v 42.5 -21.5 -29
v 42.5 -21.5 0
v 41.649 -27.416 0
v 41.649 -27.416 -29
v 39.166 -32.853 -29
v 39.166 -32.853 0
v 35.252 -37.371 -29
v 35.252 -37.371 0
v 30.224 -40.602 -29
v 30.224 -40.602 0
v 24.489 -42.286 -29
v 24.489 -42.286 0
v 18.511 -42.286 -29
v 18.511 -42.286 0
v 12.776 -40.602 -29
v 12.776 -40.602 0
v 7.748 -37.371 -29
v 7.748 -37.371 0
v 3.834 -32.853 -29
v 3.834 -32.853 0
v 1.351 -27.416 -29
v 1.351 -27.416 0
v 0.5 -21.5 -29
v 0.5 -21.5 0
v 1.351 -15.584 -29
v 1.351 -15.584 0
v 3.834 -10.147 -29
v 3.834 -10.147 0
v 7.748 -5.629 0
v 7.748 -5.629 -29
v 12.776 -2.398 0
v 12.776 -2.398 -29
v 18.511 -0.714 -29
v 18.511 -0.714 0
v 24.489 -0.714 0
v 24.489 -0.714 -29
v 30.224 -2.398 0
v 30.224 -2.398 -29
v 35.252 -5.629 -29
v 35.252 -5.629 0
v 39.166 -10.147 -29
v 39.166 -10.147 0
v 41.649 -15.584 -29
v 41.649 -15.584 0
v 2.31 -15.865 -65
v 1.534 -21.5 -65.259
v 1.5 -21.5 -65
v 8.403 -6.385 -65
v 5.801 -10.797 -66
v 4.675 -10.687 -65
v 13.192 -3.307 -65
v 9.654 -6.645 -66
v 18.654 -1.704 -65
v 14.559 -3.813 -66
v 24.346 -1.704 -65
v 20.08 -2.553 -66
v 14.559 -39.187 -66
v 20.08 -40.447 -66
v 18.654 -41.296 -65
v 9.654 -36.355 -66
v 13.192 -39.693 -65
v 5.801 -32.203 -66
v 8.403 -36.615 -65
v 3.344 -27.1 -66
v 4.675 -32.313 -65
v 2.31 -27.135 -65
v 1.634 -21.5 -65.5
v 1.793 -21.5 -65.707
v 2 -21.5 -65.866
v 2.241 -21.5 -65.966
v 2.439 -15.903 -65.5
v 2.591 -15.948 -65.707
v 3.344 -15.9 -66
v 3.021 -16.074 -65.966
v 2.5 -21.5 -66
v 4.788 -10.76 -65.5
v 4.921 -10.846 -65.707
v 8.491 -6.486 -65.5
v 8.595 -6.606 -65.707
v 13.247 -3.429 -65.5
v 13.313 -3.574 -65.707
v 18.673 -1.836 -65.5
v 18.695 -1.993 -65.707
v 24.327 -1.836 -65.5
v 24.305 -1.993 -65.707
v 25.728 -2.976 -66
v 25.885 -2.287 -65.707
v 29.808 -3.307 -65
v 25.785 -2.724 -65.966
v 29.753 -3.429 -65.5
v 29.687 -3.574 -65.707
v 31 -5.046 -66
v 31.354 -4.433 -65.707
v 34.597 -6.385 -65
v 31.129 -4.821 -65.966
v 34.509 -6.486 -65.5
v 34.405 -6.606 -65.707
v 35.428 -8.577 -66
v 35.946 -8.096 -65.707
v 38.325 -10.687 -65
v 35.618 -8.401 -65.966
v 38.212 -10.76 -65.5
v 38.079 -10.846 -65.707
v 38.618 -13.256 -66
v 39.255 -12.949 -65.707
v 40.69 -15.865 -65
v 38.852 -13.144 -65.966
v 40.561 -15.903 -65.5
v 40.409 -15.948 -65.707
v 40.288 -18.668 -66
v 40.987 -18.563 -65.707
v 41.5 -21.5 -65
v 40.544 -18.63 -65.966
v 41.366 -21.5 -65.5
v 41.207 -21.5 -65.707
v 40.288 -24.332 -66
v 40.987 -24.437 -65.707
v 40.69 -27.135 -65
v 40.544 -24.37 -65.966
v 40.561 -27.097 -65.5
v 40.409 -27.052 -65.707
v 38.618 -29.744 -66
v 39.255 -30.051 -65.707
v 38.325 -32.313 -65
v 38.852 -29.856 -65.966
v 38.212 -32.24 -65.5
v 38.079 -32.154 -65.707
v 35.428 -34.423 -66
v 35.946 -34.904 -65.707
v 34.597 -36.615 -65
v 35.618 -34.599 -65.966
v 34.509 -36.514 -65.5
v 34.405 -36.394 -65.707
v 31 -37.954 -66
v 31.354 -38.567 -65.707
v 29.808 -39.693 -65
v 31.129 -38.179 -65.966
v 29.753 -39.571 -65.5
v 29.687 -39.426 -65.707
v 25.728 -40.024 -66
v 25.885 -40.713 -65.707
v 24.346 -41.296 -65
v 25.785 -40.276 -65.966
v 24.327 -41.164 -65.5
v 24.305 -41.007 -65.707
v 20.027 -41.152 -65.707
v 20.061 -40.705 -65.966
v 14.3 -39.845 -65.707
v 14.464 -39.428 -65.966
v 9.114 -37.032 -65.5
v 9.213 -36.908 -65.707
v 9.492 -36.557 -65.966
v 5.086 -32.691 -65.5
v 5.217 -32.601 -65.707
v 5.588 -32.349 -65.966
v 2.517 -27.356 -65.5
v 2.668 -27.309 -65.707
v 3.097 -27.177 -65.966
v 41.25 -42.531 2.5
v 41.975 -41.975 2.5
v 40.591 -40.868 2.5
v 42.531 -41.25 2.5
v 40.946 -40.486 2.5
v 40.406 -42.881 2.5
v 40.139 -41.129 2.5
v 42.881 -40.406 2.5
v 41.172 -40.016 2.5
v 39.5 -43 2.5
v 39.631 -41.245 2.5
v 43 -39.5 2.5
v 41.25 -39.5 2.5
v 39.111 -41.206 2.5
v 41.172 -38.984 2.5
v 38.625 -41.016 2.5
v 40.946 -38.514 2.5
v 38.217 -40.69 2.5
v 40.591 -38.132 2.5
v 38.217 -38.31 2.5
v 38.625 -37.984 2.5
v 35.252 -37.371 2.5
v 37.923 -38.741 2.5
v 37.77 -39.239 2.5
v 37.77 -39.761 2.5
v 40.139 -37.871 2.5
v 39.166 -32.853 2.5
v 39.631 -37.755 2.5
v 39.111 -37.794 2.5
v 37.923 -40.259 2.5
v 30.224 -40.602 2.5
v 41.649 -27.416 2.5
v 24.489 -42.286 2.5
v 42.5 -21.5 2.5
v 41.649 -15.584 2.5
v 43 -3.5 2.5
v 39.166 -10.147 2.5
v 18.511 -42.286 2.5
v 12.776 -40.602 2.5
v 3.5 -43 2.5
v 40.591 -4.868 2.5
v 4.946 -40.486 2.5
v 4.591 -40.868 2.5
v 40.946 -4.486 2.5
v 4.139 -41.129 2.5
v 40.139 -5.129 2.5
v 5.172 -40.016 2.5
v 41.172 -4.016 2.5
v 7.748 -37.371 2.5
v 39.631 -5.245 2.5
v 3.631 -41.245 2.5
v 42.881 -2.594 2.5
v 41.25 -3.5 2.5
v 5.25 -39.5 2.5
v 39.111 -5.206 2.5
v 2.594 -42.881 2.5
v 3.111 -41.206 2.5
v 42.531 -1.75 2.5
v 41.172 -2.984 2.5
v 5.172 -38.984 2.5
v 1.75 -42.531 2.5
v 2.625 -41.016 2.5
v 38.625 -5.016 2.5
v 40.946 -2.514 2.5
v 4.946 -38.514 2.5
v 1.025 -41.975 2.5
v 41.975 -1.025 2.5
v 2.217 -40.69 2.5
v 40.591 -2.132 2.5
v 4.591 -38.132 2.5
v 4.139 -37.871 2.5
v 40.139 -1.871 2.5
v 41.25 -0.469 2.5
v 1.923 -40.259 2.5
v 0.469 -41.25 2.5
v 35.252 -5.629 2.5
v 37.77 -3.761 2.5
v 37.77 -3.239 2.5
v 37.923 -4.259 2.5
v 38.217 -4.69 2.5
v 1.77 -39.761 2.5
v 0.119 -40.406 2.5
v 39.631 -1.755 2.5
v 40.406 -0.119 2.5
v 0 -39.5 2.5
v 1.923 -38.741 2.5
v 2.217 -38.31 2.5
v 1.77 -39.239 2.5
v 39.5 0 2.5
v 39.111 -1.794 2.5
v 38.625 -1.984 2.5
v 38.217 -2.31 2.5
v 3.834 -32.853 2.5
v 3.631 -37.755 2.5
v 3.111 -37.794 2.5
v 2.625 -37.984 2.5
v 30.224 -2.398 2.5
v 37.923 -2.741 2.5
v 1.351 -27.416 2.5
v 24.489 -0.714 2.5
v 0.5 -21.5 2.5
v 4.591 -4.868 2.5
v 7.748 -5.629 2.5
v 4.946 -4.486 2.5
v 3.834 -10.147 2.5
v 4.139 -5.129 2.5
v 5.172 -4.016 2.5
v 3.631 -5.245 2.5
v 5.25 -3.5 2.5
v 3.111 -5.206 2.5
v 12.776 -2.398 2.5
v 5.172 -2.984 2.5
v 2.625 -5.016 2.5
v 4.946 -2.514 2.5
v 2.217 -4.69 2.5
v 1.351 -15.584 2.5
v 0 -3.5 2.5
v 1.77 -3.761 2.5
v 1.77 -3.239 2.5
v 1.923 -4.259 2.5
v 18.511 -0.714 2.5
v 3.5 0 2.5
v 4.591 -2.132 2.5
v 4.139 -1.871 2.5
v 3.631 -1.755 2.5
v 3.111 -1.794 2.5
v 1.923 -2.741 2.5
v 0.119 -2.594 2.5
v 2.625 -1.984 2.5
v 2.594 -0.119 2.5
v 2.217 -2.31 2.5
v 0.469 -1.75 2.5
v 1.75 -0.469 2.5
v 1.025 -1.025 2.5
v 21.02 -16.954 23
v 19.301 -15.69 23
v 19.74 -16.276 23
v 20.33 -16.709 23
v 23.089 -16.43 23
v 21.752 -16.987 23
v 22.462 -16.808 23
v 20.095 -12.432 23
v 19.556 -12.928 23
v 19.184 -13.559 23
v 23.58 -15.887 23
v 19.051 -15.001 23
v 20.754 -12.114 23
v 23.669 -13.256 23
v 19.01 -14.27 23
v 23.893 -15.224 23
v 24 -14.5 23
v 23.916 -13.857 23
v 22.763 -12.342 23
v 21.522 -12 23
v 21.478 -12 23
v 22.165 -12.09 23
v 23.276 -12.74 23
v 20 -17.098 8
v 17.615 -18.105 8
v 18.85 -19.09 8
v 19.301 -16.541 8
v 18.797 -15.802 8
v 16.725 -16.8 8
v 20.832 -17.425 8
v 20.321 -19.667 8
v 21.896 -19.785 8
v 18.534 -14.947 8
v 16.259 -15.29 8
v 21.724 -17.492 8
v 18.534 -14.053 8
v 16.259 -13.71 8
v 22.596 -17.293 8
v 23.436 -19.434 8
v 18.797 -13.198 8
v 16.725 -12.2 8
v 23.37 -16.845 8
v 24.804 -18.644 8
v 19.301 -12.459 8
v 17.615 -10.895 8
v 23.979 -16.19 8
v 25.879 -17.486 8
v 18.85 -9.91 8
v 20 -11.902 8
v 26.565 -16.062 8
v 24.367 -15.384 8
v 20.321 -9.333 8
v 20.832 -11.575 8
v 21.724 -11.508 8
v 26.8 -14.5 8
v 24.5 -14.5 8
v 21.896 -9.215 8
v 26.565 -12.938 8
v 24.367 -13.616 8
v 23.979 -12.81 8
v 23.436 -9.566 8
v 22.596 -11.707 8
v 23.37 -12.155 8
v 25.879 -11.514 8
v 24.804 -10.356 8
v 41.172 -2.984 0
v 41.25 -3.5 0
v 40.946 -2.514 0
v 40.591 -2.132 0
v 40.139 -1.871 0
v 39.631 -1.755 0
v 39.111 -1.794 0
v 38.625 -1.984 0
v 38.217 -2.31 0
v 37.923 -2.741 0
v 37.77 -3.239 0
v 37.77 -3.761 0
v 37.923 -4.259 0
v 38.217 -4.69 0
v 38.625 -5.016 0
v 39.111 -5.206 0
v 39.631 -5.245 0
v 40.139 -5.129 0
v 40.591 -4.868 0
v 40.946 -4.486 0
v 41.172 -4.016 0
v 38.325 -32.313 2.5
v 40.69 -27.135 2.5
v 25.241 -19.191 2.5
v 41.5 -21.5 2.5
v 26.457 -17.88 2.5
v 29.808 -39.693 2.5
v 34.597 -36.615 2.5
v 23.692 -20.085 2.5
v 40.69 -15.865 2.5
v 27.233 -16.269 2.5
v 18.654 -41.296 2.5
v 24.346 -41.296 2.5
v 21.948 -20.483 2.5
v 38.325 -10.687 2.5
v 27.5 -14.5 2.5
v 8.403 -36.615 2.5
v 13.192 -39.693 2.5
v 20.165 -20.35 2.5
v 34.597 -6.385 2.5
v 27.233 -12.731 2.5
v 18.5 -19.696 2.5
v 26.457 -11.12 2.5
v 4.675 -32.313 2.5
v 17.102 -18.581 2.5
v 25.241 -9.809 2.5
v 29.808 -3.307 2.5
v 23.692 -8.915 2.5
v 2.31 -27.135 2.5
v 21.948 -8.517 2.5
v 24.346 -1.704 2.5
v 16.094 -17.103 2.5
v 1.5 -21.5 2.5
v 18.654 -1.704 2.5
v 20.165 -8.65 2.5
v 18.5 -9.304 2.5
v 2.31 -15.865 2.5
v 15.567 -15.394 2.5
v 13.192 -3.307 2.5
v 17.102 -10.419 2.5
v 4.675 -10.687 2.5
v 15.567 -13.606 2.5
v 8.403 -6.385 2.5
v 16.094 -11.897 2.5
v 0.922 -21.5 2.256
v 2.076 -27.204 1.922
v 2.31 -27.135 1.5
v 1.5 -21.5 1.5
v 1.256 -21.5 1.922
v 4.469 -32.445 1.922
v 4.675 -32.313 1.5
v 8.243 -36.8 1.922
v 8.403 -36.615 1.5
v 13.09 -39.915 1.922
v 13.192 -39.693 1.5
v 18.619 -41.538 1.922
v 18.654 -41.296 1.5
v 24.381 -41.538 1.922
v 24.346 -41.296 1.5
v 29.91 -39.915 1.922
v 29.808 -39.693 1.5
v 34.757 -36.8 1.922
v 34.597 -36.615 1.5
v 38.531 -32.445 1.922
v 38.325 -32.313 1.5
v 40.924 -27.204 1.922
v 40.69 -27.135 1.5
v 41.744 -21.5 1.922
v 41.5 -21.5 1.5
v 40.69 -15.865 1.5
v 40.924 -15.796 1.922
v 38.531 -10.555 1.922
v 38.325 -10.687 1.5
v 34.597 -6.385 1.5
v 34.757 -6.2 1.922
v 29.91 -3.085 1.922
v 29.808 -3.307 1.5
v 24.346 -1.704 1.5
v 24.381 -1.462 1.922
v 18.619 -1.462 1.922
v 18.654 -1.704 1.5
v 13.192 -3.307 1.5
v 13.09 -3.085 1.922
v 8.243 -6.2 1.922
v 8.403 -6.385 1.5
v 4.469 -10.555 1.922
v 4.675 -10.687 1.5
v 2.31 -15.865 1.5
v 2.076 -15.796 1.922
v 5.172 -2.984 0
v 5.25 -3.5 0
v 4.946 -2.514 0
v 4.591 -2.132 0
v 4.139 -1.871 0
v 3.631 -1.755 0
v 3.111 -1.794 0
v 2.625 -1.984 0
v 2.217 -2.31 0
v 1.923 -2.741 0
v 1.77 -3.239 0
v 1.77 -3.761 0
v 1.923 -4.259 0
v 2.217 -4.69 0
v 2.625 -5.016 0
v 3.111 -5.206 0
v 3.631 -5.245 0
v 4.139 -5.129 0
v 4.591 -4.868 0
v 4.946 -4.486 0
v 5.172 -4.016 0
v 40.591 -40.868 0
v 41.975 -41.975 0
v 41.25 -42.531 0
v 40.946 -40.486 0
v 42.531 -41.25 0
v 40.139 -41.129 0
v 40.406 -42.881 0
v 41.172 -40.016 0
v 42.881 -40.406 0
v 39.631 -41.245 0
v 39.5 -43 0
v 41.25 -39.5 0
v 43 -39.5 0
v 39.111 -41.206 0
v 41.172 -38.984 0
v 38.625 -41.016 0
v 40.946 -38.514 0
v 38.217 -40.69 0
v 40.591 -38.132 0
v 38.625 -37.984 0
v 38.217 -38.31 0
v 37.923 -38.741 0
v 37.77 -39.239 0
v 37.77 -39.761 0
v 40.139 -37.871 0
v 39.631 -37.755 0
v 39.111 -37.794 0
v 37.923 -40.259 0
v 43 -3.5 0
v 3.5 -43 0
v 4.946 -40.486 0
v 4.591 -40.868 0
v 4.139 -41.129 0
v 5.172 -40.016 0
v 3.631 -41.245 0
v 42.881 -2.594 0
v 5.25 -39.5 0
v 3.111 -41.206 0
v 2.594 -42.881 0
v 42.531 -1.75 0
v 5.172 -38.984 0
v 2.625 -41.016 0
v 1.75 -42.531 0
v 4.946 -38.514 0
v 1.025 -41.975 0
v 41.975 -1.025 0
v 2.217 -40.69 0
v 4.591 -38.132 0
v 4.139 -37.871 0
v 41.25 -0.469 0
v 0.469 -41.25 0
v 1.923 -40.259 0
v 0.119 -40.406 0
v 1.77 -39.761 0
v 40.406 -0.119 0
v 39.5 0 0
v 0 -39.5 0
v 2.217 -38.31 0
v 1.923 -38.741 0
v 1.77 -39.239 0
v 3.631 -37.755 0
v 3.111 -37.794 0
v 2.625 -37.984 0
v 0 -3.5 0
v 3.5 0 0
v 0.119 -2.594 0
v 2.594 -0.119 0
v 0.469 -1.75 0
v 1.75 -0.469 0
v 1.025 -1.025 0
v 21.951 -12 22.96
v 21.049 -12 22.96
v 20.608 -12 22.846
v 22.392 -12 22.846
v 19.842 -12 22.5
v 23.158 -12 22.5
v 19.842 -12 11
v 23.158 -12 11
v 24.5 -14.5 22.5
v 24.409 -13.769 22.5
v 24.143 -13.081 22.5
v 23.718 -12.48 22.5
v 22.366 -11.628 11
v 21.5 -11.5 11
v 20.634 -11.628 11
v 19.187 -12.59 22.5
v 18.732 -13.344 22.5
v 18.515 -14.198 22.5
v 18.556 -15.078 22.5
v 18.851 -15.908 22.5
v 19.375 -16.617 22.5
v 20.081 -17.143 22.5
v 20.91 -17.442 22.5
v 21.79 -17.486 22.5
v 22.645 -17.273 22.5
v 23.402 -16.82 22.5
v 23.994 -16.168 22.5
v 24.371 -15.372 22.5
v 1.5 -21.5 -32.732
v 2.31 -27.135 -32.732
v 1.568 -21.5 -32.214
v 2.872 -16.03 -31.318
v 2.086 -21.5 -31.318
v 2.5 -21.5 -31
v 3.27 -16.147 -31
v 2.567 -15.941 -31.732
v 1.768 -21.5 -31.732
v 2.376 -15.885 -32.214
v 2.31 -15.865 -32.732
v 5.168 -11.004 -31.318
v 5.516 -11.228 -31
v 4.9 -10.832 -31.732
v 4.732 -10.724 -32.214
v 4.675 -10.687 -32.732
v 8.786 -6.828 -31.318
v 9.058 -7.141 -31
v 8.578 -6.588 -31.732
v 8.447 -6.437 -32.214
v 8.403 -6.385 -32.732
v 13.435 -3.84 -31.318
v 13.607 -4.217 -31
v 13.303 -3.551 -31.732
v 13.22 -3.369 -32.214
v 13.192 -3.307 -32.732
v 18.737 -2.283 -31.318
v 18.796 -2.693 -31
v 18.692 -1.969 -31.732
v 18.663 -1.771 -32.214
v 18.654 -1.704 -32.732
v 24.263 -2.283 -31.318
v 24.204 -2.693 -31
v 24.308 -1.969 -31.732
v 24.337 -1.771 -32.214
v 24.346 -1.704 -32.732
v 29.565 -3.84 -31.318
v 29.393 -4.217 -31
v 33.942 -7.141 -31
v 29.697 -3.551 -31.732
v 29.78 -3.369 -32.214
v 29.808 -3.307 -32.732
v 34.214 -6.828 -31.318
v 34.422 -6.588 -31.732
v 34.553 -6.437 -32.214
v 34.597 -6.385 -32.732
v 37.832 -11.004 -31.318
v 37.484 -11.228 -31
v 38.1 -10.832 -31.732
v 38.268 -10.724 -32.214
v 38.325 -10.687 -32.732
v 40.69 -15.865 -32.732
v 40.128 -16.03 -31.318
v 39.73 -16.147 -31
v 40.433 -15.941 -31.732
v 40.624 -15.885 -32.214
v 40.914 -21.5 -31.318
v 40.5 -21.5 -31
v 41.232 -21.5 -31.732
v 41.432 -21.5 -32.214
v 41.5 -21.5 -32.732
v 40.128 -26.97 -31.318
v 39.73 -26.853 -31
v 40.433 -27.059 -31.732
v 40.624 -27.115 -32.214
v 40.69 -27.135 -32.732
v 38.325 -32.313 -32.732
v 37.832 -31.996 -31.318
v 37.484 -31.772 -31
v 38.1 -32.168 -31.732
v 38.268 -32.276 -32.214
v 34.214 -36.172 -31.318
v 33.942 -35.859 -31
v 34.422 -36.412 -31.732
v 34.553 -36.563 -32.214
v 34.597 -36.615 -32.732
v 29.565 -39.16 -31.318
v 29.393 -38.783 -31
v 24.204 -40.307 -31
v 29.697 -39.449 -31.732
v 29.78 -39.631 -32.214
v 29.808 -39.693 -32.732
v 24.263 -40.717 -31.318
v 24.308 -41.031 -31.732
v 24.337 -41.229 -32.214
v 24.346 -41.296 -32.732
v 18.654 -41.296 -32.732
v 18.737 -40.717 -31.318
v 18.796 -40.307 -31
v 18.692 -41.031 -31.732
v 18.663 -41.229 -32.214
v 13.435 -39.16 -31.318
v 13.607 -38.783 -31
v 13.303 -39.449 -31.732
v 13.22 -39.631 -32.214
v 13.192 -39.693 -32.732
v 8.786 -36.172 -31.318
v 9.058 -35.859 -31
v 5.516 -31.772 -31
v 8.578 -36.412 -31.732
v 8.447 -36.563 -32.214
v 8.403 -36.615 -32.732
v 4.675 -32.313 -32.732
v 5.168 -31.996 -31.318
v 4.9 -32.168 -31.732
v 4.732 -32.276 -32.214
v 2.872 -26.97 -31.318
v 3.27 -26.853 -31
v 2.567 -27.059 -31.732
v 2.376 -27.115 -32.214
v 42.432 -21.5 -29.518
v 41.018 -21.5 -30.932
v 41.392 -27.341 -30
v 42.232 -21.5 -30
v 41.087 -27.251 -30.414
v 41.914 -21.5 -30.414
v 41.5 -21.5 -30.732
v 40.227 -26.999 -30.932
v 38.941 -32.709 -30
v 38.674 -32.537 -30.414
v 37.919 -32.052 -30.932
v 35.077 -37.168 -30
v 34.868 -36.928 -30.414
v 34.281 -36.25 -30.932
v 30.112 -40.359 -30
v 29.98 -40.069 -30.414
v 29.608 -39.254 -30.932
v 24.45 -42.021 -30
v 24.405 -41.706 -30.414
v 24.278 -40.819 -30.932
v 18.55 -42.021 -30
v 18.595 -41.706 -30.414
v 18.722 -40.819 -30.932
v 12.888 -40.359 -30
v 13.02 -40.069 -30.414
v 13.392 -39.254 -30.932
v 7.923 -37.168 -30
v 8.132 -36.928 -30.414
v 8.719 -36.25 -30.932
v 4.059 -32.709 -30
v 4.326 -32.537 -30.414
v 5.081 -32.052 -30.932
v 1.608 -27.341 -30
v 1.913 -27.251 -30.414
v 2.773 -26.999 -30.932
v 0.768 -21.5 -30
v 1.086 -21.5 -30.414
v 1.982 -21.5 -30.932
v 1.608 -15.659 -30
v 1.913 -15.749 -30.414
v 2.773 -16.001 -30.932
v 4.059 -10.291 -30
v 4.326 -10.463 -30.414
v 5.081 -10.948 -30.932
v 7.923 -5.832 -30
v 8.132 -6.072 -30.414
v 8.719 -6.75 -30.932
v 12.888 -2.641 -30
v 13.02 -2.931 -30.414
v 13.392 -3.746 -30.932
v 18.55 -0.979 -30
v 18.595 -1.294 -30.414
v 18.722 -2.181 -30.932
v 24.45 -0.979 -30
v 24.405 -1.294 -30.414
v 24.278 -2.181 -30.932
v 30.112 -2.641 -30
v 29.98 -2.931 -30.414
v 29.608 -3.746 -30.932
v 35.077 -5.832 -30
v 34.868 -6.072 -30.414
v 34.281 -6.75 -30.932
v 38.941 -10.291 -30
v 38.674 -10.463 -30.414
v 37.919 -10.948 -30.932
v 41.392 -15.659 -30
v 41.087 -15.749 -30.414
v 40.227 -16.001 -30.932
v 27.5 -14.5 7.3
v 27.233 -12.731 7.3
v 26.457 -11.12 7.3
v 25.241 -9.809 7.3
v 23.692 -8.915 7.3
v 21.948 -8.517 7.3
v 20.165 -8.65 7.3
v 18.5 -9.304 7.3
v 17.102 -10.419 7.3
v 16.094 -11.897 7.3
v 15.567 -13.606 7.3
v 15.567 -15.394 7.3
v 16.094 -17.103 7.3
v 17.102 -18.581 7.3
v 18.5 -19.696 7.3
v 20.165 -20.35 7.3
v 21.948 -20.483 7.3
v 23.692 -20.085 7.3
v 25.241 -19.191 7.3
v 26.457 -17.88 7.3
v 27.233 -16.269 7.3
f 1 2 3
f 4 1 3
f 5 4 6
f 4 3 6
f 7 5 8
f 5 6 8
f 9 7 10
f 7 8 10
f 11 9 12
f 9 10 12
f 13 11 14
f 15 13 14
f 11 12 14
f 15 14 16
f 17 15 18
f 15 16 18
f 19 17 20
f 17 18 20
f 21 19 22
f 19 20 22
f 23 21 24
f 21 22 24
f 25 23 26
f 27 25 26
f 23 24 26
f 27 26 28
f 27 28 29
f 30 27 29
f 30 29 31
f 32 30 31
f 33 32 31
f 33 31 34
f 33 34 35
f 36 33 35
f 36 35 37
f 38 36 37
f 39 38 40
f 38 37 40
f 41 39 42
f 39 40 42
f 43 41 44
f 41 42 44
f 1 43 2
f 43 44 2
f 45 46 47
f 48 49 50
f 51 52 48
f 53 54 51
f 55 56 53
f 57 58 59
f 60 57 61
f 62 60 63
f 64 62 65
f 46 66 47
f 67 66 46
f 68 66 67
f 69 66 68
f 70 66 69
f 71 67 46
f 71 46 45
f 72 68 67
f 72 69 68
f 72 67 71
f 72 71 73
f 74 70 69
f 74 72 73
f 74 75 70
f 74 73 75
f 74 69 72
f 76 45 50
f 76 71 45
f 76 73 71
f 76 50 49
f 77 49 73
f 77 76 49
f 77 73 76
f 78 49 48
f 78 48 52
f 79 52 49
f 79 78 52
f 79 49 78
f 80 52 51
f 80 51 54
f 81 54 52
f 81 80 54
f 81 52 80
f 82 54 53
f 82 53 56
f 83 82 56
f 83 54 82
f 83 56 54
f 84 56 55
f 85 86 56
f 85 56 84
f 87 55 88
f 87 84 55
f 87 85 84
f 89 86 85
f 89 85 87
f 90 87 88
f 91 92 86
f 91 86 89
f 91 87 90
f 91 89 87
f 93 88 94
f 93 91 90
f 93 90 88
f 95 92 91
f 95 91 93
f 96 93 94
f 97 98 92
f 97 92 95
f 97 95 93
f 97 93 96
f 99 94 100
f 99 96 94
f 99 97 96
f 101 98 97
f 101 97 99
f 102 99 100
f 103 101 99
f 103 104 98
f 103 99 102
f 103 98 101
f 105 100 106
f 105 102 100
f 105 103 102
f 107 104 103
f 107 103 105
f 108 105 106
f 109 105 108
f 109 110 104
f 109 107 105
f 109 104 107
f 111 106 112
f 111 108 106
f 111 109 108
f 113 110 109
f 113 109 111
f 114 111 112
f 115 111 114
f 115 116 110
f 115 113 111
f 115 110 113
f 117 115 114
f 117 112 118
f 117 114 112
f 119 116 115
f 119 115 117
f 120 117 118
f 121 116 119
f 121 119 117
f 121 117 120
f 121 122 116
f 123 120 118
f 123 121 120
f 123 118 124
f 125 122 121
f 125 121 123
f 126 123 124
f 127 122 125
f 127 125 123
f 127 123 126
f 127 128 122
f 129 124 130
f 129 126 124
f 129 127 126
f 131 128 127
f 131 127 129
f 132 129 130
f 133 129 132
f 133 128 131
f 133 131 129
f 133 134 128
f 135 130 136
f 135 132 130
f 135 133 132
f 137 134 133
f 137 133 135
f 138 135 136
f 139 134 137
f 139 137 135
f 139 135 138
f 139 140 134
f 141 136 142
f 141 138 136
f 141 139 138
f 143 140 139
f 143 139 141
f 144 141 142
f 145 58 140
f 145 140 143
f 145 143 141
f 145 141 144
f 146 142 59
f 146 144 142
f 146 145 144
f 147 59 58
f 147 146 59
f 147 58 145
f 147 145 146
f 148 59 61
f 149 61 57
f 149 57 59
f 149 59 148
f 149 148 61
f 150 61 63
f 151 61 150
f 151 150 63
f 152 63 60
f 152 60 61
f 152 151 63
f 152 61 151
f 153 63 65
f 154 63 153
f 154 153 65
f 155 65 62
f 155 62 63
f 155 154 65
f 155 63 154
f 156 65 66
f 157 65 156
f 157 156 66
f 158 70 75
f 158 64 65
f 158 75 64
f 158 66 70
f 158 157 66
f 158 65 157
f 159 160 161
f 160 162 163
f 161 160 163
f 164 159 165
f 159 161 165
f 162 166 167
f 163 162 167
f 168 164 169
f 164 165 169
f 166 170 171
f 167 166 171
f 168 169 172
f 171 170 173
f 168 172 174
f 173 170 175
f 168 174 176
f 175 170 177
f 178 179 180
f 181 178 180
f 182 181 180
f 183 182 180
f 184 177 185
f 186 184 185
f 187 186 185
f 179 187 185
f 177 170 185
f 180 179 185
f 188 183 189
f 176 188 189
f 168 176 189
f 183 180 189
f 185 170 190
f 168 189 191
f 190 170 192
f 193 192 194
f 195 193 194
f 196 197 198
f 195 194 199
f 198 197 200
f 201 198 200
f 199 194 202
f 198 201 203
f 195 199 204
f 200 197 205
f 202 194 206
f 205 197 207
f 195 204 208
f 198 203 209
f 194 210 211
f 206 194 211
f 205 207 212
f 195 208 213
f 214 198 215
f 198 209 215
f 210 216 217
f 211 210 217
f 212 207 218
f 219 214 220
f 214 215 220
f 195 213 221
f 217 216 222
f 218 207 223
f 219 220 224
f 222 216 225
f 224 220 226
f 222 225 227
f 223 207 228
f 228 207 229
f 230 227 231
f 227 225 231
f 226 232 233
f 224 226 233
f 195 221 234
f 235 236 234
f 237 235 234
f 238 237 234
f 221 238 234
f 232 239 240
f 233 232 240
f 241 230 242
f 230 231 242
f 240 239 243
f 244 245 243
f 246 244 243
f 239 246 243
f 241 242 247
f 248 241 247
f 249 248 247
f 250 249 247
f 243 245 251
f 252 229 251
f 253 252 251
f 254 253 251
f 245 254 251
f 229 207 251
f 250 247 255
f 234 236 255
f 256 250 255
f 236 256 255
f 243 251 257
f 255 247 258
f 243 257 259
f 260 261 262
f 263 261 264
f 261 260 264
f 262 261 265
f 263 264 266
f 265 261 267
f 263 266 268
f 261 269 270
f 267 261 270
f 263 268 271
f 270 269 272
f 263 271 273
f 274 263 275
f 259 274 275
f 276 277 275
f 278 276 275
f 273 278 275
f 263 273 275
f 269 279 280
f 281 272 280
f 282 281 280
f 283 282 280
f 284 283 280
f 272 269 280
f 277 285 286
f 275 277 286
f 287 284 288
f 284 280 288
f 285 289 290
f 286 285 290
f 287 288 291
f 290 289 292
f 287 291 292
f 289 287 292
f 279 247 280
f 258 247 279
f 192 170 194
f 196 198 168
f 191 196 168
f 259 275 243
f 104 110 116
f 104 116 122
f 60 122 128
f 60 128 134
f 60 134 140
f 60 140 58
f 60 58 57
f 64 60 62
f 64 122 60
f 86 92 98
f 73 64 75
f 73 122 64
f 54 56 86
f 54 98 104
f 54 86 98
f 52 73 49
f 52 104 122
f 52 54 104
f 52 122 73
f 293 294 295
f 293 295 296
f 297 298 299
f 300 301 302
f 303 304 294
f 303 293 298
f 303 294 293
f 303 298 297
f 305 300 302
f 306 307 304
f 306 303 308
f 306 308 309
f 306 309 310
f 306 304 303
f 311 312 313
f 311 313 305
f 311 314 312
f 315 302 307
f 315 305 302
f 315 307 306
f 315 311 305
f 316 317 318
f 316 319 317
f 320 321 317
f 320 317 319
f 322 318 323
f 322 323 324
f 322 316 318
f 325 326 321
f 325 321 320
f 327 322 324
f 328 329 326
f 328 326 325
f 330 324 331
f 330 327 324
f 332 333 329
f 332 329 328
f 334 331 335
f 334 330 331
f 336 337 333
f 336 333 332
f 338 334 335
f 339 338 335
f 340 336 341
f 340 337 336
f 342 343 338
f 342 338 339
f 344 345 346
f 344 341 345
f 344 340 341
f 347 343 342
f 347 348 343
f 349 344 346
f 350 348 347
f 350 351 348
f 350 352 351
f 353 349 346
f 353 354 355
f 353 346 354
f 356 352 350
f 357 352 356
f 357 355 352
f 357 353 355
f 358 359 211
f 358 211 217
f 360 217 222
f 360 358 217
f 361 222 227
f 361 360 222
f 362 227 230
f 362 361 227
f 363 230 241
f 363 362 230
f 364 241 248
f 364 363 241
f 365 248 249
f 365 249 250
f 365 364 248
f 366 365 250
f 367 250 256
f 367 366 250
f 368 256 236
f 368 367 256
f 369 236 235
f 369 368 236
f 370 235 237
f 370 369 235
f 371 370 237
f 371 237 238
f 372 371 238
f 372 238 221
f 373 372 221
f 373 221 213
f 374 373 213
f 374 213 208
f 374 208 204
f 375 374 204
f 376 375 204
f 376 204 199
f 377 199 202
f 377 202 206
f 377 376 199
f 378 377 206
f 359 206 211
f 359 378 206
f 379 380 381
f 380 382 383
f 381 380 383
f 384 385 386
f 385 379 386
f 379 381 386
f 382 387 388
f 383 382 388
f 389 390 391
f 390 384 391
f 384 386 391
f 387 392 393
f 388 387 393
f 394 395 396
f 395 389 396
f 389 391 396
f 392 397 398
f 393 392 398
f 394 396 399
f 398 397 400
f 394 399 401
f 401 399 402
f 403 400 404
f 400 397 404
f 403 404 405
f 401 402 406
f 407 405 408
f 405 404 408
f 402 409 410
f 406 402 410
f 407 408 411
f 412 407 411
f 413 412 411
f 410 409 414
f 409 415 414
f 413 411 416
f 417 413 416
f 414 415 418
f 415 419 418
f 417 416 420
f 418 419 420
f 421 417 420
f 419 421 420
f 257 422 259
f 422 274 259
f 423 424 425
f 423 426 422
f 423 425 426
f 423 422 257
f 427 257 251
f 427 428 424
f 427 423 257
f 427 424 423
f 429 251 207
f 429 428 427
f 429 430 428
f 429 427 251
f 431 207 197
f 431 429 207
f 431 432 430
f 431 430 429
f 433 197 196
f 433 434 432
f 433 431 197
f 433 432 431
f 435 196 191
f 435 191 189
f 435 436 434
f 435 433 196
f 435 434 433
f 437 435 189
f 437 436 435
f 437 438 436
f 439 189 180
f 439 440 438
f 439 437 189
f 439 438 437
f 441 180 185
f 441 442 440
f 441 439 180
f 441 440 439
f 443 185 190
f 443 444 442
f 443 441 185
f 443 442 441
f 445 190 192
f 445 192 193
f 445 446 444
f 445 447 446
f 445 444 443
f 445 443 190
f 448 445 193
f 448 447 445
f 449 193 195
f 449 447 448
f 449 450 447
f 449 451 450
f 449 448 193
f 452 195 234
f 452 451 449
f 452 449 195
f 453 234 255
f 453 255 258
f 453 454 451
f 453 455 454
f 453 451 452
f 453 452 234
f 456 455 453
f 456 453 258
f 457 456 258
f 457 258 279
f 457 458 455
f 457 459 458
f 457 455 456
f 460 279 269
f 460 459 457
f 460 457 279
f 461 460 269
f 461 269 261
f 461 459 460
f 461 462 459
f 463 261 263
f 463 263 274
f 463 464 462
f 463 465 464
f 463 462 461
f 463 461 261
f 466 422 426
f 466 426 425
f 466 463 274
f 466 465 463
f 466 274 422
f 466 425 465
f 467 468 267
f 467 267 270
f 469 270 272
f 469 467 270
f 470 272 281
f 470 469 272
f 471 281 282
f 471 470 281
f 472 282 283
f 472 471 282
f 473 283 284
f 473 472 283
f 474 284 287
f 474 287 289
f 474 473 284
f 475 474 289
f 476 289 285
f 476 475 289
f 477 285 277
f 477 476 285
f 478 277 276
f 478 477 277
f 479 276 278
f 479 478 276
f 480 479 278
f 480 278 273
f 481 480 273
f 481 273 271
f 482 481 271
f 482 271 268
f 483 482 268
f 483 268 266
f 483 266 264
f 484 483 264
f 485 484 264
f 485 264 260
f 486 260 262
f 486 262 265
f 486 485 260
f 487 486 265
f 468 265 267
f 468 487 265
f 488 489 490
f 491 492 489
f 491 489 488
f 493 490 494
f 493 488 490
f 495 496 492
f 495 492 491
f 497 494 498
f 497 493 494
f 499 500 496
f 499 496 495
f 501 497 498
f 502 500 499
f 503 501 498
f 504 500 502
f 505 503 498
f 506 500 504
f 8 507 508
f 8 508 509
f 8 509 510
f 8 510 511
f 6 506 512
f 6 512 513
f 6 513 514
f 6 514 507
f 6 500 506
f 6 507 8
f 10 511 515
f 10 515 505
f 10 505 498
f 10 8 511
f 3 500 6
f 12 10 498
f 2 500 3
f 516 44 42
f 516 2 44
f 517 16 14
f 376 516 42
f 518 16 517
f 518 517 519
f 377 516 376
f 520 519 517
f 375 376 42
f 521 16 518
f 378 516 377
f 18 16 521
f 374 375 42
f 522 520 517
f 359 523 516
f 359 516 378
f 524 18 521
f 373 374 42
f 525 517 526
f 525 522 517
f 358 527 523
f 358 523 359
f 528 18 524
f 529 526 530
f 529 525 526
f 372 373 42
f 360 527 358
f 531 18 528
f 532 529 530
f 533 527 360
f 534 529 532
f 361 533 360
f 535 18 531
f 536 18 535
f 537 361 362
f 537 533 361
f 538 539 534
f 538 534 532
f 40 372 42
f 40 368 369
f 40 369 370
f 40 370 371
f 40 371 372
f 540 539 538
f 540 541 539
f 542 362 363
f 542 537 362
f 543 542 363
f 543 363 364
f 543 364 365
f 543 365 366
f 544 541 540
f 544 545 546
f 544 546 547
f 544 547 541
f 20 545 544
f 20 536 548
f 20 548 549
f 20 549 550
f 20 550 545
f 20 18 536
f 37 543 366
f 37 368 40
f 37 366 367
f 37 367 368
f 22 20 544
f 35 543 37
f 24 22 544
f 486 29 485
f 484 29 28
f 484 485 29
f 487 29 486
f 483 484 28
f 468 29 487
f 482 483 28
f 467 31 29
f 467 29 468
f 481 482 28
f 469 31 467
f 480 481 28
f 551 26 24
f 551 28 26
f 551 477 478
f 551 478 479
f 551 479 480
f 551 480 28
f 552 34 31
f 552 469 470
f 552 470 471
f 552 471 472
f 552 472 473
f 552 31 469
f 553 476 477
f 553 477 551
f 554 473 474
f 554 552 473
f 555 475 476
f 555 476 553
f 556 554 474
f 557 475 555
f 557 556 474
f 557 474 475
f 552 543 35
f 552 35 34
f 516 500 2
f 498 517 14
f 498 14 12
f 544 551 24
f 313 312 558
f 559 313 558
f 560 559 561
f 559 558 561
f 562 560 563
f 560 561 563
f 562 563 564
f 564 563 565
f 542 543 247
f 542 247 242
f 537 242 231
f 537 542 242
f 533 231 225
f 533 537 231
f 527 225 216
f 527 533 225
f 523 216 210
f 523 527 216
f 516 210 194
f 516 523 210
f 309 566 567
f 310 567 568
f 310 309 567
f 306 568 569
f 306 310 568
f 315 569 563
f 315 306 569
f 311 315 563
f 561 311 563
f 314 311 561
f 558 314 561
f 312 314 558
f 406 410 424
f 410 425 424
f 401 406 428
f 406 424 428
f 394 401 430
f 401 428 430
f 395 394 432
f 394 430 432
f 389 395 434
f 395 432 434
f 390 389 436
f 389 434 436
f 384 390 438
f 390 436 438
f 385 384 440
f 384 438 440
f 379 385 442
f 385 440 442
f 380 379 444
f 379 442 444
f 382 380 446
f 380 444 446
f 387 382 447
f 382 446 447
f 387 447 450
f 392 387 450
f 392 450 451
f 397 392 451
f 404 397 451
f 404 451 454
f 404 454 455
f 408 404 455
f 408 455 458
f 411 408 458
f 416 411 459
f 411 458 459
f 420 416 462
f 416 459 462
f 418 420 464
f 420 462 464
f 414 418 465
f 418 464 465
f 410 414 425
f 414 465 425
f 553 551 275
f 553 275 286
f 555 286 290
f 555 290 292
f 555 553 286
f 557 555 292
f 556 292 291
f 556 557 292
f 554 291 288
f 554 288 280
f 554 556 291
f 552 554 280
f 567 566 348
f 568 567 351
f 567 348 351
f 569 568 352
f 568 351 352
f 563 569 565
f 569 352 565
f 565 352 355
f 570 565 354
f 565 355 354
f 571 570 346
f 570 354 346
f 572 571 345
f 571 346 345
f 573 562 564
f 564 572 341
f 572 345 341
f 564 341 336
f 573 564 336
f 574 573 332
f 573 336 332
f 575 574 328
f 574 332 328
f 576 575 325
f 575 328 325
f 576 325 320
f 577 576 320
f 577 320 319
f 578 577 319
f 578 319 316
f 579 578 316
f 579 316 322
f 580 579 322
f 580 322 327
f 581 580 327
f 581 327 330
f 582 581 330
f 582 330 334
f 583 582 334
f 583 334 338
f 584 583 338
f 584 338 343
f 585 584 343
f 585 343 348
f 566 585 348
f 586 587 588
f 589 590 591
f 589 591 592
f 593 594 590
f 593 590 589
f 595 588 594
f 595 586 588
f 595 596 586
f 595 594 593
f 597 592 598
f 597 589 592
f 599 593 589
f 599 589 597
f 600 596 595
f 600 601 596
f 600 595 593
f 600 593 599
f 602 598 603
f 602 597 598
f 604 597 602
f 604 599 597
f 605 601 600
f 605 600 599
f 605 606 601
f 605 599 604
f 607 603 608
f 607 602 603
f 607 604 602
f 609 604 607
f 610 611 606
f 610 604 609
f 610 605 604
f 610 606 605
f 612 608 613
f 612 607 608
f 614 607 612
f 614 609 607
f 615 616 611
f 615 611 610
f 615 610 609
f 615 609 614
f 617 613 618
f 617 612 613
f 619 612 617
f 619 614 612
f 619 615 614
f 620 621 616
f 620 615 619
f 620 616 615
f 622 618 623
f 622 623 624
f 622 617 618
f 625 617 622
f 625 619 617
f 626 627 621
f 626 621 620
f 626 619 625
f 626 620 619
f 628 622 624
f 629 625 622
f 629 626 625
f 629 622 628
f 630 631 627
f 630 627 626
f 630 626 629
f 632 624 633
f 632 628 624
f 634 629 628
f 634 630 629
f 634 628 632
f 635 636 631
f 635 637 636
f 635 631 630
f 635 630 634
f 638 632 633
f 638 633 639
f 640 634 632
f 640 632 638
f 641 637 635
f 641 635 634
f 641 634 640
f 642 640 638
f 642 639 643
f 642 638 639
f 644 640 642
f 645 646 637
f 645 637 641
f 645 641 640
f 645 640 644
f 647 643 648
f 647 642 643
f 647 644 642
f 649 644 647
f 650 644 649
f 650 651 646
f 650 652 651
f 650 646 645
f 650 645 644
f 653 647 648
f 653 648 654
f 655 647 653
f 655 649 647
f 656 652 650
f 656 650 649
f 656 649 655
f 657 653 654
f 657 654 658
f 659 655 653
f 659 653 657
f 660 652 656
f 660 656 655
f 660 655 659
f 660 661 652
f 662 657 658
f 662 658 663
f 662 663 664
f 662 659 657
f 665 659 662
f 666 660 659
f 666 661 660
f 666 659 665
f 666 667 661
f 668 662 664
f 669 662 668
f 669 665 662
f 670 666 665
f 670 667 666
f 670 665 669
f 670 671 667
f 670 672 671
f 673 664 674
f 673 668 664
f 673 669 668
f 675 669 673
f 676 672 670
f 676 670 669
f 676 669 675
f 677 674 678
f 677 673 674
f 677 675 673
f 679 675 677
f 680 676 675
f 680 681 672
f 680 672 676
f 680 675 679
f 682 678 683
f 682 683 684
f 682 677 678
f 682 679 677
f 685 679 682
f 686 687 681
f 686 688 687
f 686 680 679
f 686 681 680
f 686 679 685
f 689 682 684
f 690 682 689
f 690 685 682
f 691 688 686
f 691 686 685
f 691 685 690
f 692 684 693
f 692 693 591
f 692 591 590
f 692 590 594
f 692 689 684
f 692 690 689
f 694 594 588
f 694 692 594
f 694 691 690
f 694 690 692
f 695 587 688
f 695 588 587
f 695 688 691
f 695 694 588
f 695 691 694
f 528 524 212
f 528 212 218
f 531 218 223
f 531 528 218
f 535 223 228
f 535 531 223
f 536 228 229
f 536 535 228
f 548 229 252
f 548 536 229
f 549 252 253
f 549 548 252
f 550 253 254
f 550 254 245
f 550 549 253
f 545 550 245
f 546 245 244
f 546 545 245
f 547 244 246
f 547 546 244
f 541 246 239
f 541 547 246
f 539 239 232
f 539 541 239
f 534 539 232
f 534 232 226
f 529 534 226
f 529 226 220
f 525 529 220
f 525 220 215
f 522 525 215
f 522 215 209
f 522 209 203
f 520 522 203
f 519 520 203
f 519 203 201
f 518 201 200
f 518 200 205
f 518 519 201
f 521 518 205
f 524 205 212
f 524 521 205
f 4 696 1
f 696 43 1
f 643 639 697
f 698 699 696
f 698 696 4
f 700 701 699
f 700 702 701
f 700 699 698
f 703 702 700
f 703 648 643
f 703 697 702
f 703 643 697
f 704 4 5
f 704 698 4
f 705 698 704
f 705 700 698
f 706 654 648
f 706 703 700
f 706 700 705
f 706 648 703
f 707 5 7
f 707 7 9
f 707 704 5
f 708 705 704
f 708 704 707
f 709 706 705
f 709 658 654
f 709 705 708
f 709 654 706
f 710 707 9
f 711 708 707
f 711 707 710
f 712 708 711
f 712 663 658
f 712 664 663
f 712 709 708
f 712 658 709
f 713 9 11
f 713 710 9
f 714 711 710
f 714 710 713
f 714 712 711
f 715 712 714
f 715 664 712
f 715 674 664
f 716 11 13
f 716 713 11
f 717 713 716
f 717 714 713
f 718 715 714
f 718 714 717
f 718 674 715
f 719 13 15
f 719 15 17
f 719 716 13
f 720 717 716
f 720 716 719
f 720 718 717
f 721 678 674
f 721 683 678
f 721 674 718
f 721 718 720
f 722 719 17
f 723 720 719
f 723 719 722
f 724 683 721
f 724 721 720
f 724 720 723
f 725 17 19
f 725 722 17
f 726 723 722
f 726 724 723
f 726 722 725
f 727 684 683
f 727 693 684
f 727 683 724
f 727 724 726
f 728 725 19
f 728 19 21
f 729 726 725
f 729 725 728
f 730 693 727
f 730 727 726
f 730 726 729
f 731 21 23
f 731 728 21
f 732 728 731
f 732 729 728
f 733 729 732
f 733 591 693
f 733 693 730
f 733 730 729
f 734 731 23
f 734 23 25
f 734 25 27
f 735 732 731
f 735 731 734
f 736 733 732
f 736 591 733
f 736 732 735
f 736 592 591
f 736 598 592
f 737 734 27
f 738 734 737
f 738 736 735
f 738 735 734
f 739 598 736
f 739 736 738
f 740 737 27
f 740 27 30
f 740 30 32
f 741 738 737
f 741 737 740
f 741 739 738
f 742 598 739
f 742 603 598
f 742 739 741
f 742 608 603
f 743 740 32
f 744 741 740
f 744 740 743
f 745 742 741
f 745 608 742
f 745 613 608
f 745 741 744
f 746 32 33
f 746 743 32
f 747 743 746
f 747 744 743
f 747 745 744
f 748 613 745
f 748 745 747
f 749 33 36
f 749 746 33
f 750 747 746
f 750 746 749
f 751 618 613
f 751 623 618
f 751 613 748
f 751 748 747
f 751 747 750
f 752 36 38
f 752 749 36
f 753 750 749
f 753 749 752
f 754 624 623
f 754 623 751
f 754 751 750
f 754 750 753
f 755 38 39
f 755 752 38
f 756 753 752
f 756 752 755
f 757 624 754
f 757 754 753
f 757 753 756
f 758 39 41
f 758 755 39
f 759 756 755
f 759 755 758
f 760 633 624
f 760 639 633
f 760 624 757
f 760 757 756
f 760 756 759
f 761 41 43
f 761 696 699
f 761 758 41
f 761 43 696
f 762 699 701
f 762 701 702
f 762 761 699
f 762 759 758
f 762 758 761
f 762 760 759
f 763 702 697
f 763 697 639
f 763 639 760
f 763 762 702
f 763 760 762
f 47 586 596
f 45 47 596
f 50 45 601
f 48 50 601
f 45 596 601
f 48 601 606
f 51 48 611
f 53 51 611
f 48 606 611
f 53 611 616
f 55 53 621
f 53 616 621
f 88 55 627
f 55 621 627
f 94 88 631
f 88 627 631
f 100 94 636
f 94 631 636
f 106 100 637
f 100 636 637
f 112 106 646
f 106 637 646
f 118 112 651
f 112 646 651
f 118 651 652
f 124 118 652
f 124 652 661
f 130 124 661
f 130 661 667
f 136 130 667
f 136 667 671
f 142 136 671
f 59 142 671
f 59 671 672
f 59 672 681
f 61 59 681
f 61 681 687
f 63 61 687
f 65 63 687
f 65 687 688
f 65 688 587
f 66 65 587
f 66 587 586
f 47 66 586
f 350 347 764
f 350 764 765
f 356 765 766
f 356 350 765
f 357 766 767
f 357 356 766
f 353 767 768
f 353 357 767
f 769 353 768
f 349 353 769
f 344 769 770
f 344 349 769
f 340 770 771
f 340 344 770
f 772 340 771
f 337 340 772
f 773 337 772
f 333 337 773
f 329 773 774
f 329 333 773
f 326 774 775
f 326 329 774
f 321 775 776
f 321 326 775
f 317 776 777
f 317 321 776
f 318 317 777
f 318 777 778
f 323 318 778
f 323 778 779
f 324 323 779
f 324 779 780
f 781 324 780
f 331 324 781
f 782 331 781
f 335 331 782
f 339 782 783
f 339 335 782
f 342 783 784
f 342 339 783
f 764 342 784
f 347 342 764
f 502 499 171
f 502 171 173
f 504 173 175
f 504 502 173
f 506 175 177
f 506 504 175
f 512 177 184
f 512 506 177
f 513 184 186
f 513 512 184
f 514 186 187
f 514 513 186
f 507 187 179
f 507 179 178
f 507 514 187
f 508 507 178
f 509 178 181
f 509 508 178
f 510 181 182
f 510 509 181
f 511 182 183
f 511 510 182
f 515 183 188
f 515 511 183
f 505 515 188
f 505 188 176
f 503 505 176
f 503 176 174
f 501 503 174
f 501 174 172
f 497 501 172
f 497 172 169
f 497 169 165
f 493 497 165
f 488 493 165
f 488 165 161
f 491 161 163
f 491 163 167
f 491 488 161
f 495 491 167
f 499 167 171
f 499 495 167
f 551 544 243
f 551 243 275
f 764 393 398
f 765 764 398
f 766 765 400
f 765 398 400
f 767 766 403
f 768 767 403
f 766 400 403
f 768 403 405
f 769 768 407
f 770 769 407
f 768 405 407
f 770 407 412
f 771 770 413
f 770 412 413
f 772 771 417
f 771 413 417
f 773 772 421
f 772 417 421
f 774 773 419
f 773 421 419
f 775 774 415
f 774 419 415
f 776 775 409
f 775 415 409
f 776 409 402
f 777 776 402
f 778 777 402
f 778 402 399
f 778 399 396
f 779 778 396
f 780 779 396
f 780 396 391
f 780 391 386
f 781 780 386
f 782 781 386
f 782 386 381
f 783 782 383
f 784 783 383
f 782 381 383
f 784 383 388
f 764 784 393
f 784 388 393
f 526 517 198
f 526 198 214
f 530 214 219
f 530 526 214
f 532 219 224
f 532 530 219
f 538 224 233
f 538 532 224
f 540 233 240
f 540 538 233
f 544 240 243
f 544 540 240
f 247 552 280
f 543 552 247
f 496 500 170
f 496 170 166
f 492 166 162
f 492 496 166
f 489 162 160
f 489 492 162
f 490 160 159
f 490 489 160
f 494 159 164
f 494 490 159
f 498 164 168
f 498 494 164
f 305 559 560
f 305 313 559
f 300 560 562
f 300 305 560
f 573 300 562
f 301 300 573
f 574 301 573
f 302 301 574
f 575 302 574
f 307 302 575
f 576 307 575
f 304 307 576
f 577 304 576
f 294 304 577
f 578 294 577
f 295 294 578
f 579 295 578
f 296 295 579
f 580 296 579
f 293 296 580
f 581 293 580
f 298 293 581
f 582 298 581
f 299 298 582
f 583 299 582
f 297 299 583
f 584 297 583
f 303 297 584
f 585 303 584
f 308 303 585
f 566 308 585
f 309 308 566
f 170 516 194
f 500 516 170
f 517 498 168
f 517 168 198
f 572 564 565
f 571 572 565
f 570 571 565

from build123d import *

# Parameters (mm, degrees)
SKETCH1_R           = 1.75
BOSS_EXTRUDE1_DEPTH = 2.5
SKETCH2_R           = 6
BOSS_EXTRUDE2_DEPTH = 5.5
SKETCH3_R           = 3
BOSS_EXTRUDE3_DEPTH = 15
CHAMFER1_SIZE       = 0.7
SKETCH4_W           = 12
SKETCH4_H           = 2.8
CUT_EXTRUDE1_DEPTH  = 66.015382795
CHAMFER2_SIZE       = 0.5
SKETCH5_R           = 21
BOSS_EXTRUDE4_DEPTH = 31
FILLET1_R           = 2
SKETCH6_R           = 20
BOSS_EXTRUDE5_DEPTH = 35
FILLET2_R           = 2
FILLET3_R           = 1


# Some blends are built 0.0001 mm under size
with BuildPart() as part:
    # Sketch1 → Boss-Extrude1 (new body)
    with BuildSketch(Plane.XY):
        with BuildLine():
            Line((3.5, 0), (39.5, 0))
            ThreePointArc((39.5, 0), (41.974873734, -1.025126266), (43, -3.5))
            Line((43, -3.5), (43, -39.5))
            ThreePointArc((43, -39.5), (41.974873734, -41.974873734), (39.5, -43))
            Line((39.5, -43), (3.5, -43))
            ThreePointArc((3.5, -43), (1.025126266, -41.974873734), (0, -39.5))
            Line((0, -39.5), (0, -3.5))
            ThreePointArc((0, -3.5), (1.025126266, -1.025126266), (3.5, 0))
        make_face()
        with Locations((3.5, -3.5)):
            Circle(SKETCH1_R, mode=Mode.SUBTRACT)
        with Locations((39.5, -3.5)):
            Circle(SKETCH1_R, mode=Mode.SUBTRACT)
        with Locations((3.5, -39.5)):
            Circle(SKETCH1_R, mode=Mode.SUBTRACT)
        with Locations((39.5, -39.5)):
            Circle(SKETCH1_R, mode=Mode.SUBTRACT)
    extrude(amount=BOSS_EXTRUDE1_DEPTH)

    # Sketch2 → Boss-Extrude2 (add)
    with BuildSketch(Plane.XY.offset(2.5)):
        with Locations((21.5, -14.5)):
            Circle(SKETCH2_R)
    extrude(amount=BOSS_EXTRUDE2_DEPTH)

    # Sketch3 → Boss-Extrude3 (add)
    with BuildSketch(Plane.XY.offset(8)):
        with Locations((21.5, -14.5)):
            Circle(SKETCH3_R)
    extrude(amount=BOSS_EXTRUDE3_DEPTH)

    # Chamfer1
    chamfer1_edges = [part.edges().sort_by_distance(p)[0] for p in [
        (15.5, -14.5, 8),
    ]]
    chamfer(chamfer1_edges, length=CHAMFER1_SIZE)

    # Sketch4 → Cut-Extrude1 (cut, through all)
    with BuildSketch(Plane(origin=(43, 0, 0), x_dir=(0, 0, -1), z_dir=(1, 0, 0))):
        with Locations((-17, -10.6)):
            Rectangle(SKETCH4_W, SKETCH4_H)
    extrude(amount=-CUT_EXTRUDE1_DEPTH, mode=Mode.SUBTRACT)

    # Chamfer2
    chamfer2_edges = [part.edges().sort_by_distance(p)[0] for p in [
        (20.081362835, -17.143382037, 23),
    ]]
    chamfer(chamfer2_edges, length=CHAMFER2_SIZE - 0.0001)  # a hair under: the kernel refuses the full size

    # Sketch5 → Boss-Extrude4 (add)
    with BuildSketch(Plane(origin=(0, 0, 0), x_dir=(-1, 0, 0), z_dir=(0, 0, -1))):
        with Locations(Location((-21.5, -21.5, 0), (0, 0, 180))):
            Circle(SKETCH5_R)
    extrude(amount=BOSS_EXTRUDE4_DEPTH)

    # Fillet1
    fillet1_edges = [part.edges().sort_by_distance(p)[0] for p in [
        (0.5, -21.5, -31),
    ]]
    fillet(fillet1_edges, radius=FILLET1_R)

    # Sketch6 → Boss-Extrude5 (add)
    with BuildSketch(Plane(origin=(0, 0, -31), x_dir=(-1, 0, 0), z_dir=(0, 0, -1))):
        with Locations((-21.5, -21.5)):
            Circle(SKETCH6_R)
    extrude(amount=BOSS_EXTRUDE5_DEPTH)

    # Fillet2
    # the kernel refuses this fillet: 2 mm, written as the material it takes off along each edge
    with BuildSketch(Plane(origin=(21.5, -21.5, -31), x_dir=(-1, 0, 0), z_dir=(0, -1, 0))) as fillet2_piece_1:
        with BuildLine():
            CenterArc((18, 1.732050808), FILLET2_R, 300, 60)
            Line((19, 0), (20, 0))
            Line((20, 0), (20, 1.732050808))
        make_face()
    revolve(axis=Axis((21.5, -21.5, -31), (0, 0, -1)), mode=Mode.SUBTRACT)

    # Fillet3
    fillet3_edges = [part.edges().sort_by_distance(p)[0] for p in [
        (41.5, -21.5, -66),
    ]]
    fillet(fillet3_edges, radius=FILLET3_R)

    # Sketch7 → Cut-Revolve1 (revolve, cut)
    with BuildSketch(Plane(origin=(21.5, 0, 0), x_dir=(0, 0, -1), z_dir=(1, 0, 0)), mode=Mode.PRIVATE) as cut_revolve1_sk:
        with BuildLine():
            Line((-2.5, -1.5), (-1.5, -1.5))
            add(Edge.make_bspline(
                [(-2.5, -0.5), (-2.2, -1.2), (-1.5, -1.5)],
                knots=[0, 0, 0, 1, 1, 1], degree=2))
            Line((-2.5, -0.5), (-2.5, -1.5))
        make_face()
    revolve(cut_revolve1_sk.sketch.rotate(Axis((21.5, -21.5, -66), (0, 0, 1)), 90), axis=Axis((21.5, -21.5, -66), (0, 0, 1)), mode=Mode.SUBTRACT)


solid = part.part
